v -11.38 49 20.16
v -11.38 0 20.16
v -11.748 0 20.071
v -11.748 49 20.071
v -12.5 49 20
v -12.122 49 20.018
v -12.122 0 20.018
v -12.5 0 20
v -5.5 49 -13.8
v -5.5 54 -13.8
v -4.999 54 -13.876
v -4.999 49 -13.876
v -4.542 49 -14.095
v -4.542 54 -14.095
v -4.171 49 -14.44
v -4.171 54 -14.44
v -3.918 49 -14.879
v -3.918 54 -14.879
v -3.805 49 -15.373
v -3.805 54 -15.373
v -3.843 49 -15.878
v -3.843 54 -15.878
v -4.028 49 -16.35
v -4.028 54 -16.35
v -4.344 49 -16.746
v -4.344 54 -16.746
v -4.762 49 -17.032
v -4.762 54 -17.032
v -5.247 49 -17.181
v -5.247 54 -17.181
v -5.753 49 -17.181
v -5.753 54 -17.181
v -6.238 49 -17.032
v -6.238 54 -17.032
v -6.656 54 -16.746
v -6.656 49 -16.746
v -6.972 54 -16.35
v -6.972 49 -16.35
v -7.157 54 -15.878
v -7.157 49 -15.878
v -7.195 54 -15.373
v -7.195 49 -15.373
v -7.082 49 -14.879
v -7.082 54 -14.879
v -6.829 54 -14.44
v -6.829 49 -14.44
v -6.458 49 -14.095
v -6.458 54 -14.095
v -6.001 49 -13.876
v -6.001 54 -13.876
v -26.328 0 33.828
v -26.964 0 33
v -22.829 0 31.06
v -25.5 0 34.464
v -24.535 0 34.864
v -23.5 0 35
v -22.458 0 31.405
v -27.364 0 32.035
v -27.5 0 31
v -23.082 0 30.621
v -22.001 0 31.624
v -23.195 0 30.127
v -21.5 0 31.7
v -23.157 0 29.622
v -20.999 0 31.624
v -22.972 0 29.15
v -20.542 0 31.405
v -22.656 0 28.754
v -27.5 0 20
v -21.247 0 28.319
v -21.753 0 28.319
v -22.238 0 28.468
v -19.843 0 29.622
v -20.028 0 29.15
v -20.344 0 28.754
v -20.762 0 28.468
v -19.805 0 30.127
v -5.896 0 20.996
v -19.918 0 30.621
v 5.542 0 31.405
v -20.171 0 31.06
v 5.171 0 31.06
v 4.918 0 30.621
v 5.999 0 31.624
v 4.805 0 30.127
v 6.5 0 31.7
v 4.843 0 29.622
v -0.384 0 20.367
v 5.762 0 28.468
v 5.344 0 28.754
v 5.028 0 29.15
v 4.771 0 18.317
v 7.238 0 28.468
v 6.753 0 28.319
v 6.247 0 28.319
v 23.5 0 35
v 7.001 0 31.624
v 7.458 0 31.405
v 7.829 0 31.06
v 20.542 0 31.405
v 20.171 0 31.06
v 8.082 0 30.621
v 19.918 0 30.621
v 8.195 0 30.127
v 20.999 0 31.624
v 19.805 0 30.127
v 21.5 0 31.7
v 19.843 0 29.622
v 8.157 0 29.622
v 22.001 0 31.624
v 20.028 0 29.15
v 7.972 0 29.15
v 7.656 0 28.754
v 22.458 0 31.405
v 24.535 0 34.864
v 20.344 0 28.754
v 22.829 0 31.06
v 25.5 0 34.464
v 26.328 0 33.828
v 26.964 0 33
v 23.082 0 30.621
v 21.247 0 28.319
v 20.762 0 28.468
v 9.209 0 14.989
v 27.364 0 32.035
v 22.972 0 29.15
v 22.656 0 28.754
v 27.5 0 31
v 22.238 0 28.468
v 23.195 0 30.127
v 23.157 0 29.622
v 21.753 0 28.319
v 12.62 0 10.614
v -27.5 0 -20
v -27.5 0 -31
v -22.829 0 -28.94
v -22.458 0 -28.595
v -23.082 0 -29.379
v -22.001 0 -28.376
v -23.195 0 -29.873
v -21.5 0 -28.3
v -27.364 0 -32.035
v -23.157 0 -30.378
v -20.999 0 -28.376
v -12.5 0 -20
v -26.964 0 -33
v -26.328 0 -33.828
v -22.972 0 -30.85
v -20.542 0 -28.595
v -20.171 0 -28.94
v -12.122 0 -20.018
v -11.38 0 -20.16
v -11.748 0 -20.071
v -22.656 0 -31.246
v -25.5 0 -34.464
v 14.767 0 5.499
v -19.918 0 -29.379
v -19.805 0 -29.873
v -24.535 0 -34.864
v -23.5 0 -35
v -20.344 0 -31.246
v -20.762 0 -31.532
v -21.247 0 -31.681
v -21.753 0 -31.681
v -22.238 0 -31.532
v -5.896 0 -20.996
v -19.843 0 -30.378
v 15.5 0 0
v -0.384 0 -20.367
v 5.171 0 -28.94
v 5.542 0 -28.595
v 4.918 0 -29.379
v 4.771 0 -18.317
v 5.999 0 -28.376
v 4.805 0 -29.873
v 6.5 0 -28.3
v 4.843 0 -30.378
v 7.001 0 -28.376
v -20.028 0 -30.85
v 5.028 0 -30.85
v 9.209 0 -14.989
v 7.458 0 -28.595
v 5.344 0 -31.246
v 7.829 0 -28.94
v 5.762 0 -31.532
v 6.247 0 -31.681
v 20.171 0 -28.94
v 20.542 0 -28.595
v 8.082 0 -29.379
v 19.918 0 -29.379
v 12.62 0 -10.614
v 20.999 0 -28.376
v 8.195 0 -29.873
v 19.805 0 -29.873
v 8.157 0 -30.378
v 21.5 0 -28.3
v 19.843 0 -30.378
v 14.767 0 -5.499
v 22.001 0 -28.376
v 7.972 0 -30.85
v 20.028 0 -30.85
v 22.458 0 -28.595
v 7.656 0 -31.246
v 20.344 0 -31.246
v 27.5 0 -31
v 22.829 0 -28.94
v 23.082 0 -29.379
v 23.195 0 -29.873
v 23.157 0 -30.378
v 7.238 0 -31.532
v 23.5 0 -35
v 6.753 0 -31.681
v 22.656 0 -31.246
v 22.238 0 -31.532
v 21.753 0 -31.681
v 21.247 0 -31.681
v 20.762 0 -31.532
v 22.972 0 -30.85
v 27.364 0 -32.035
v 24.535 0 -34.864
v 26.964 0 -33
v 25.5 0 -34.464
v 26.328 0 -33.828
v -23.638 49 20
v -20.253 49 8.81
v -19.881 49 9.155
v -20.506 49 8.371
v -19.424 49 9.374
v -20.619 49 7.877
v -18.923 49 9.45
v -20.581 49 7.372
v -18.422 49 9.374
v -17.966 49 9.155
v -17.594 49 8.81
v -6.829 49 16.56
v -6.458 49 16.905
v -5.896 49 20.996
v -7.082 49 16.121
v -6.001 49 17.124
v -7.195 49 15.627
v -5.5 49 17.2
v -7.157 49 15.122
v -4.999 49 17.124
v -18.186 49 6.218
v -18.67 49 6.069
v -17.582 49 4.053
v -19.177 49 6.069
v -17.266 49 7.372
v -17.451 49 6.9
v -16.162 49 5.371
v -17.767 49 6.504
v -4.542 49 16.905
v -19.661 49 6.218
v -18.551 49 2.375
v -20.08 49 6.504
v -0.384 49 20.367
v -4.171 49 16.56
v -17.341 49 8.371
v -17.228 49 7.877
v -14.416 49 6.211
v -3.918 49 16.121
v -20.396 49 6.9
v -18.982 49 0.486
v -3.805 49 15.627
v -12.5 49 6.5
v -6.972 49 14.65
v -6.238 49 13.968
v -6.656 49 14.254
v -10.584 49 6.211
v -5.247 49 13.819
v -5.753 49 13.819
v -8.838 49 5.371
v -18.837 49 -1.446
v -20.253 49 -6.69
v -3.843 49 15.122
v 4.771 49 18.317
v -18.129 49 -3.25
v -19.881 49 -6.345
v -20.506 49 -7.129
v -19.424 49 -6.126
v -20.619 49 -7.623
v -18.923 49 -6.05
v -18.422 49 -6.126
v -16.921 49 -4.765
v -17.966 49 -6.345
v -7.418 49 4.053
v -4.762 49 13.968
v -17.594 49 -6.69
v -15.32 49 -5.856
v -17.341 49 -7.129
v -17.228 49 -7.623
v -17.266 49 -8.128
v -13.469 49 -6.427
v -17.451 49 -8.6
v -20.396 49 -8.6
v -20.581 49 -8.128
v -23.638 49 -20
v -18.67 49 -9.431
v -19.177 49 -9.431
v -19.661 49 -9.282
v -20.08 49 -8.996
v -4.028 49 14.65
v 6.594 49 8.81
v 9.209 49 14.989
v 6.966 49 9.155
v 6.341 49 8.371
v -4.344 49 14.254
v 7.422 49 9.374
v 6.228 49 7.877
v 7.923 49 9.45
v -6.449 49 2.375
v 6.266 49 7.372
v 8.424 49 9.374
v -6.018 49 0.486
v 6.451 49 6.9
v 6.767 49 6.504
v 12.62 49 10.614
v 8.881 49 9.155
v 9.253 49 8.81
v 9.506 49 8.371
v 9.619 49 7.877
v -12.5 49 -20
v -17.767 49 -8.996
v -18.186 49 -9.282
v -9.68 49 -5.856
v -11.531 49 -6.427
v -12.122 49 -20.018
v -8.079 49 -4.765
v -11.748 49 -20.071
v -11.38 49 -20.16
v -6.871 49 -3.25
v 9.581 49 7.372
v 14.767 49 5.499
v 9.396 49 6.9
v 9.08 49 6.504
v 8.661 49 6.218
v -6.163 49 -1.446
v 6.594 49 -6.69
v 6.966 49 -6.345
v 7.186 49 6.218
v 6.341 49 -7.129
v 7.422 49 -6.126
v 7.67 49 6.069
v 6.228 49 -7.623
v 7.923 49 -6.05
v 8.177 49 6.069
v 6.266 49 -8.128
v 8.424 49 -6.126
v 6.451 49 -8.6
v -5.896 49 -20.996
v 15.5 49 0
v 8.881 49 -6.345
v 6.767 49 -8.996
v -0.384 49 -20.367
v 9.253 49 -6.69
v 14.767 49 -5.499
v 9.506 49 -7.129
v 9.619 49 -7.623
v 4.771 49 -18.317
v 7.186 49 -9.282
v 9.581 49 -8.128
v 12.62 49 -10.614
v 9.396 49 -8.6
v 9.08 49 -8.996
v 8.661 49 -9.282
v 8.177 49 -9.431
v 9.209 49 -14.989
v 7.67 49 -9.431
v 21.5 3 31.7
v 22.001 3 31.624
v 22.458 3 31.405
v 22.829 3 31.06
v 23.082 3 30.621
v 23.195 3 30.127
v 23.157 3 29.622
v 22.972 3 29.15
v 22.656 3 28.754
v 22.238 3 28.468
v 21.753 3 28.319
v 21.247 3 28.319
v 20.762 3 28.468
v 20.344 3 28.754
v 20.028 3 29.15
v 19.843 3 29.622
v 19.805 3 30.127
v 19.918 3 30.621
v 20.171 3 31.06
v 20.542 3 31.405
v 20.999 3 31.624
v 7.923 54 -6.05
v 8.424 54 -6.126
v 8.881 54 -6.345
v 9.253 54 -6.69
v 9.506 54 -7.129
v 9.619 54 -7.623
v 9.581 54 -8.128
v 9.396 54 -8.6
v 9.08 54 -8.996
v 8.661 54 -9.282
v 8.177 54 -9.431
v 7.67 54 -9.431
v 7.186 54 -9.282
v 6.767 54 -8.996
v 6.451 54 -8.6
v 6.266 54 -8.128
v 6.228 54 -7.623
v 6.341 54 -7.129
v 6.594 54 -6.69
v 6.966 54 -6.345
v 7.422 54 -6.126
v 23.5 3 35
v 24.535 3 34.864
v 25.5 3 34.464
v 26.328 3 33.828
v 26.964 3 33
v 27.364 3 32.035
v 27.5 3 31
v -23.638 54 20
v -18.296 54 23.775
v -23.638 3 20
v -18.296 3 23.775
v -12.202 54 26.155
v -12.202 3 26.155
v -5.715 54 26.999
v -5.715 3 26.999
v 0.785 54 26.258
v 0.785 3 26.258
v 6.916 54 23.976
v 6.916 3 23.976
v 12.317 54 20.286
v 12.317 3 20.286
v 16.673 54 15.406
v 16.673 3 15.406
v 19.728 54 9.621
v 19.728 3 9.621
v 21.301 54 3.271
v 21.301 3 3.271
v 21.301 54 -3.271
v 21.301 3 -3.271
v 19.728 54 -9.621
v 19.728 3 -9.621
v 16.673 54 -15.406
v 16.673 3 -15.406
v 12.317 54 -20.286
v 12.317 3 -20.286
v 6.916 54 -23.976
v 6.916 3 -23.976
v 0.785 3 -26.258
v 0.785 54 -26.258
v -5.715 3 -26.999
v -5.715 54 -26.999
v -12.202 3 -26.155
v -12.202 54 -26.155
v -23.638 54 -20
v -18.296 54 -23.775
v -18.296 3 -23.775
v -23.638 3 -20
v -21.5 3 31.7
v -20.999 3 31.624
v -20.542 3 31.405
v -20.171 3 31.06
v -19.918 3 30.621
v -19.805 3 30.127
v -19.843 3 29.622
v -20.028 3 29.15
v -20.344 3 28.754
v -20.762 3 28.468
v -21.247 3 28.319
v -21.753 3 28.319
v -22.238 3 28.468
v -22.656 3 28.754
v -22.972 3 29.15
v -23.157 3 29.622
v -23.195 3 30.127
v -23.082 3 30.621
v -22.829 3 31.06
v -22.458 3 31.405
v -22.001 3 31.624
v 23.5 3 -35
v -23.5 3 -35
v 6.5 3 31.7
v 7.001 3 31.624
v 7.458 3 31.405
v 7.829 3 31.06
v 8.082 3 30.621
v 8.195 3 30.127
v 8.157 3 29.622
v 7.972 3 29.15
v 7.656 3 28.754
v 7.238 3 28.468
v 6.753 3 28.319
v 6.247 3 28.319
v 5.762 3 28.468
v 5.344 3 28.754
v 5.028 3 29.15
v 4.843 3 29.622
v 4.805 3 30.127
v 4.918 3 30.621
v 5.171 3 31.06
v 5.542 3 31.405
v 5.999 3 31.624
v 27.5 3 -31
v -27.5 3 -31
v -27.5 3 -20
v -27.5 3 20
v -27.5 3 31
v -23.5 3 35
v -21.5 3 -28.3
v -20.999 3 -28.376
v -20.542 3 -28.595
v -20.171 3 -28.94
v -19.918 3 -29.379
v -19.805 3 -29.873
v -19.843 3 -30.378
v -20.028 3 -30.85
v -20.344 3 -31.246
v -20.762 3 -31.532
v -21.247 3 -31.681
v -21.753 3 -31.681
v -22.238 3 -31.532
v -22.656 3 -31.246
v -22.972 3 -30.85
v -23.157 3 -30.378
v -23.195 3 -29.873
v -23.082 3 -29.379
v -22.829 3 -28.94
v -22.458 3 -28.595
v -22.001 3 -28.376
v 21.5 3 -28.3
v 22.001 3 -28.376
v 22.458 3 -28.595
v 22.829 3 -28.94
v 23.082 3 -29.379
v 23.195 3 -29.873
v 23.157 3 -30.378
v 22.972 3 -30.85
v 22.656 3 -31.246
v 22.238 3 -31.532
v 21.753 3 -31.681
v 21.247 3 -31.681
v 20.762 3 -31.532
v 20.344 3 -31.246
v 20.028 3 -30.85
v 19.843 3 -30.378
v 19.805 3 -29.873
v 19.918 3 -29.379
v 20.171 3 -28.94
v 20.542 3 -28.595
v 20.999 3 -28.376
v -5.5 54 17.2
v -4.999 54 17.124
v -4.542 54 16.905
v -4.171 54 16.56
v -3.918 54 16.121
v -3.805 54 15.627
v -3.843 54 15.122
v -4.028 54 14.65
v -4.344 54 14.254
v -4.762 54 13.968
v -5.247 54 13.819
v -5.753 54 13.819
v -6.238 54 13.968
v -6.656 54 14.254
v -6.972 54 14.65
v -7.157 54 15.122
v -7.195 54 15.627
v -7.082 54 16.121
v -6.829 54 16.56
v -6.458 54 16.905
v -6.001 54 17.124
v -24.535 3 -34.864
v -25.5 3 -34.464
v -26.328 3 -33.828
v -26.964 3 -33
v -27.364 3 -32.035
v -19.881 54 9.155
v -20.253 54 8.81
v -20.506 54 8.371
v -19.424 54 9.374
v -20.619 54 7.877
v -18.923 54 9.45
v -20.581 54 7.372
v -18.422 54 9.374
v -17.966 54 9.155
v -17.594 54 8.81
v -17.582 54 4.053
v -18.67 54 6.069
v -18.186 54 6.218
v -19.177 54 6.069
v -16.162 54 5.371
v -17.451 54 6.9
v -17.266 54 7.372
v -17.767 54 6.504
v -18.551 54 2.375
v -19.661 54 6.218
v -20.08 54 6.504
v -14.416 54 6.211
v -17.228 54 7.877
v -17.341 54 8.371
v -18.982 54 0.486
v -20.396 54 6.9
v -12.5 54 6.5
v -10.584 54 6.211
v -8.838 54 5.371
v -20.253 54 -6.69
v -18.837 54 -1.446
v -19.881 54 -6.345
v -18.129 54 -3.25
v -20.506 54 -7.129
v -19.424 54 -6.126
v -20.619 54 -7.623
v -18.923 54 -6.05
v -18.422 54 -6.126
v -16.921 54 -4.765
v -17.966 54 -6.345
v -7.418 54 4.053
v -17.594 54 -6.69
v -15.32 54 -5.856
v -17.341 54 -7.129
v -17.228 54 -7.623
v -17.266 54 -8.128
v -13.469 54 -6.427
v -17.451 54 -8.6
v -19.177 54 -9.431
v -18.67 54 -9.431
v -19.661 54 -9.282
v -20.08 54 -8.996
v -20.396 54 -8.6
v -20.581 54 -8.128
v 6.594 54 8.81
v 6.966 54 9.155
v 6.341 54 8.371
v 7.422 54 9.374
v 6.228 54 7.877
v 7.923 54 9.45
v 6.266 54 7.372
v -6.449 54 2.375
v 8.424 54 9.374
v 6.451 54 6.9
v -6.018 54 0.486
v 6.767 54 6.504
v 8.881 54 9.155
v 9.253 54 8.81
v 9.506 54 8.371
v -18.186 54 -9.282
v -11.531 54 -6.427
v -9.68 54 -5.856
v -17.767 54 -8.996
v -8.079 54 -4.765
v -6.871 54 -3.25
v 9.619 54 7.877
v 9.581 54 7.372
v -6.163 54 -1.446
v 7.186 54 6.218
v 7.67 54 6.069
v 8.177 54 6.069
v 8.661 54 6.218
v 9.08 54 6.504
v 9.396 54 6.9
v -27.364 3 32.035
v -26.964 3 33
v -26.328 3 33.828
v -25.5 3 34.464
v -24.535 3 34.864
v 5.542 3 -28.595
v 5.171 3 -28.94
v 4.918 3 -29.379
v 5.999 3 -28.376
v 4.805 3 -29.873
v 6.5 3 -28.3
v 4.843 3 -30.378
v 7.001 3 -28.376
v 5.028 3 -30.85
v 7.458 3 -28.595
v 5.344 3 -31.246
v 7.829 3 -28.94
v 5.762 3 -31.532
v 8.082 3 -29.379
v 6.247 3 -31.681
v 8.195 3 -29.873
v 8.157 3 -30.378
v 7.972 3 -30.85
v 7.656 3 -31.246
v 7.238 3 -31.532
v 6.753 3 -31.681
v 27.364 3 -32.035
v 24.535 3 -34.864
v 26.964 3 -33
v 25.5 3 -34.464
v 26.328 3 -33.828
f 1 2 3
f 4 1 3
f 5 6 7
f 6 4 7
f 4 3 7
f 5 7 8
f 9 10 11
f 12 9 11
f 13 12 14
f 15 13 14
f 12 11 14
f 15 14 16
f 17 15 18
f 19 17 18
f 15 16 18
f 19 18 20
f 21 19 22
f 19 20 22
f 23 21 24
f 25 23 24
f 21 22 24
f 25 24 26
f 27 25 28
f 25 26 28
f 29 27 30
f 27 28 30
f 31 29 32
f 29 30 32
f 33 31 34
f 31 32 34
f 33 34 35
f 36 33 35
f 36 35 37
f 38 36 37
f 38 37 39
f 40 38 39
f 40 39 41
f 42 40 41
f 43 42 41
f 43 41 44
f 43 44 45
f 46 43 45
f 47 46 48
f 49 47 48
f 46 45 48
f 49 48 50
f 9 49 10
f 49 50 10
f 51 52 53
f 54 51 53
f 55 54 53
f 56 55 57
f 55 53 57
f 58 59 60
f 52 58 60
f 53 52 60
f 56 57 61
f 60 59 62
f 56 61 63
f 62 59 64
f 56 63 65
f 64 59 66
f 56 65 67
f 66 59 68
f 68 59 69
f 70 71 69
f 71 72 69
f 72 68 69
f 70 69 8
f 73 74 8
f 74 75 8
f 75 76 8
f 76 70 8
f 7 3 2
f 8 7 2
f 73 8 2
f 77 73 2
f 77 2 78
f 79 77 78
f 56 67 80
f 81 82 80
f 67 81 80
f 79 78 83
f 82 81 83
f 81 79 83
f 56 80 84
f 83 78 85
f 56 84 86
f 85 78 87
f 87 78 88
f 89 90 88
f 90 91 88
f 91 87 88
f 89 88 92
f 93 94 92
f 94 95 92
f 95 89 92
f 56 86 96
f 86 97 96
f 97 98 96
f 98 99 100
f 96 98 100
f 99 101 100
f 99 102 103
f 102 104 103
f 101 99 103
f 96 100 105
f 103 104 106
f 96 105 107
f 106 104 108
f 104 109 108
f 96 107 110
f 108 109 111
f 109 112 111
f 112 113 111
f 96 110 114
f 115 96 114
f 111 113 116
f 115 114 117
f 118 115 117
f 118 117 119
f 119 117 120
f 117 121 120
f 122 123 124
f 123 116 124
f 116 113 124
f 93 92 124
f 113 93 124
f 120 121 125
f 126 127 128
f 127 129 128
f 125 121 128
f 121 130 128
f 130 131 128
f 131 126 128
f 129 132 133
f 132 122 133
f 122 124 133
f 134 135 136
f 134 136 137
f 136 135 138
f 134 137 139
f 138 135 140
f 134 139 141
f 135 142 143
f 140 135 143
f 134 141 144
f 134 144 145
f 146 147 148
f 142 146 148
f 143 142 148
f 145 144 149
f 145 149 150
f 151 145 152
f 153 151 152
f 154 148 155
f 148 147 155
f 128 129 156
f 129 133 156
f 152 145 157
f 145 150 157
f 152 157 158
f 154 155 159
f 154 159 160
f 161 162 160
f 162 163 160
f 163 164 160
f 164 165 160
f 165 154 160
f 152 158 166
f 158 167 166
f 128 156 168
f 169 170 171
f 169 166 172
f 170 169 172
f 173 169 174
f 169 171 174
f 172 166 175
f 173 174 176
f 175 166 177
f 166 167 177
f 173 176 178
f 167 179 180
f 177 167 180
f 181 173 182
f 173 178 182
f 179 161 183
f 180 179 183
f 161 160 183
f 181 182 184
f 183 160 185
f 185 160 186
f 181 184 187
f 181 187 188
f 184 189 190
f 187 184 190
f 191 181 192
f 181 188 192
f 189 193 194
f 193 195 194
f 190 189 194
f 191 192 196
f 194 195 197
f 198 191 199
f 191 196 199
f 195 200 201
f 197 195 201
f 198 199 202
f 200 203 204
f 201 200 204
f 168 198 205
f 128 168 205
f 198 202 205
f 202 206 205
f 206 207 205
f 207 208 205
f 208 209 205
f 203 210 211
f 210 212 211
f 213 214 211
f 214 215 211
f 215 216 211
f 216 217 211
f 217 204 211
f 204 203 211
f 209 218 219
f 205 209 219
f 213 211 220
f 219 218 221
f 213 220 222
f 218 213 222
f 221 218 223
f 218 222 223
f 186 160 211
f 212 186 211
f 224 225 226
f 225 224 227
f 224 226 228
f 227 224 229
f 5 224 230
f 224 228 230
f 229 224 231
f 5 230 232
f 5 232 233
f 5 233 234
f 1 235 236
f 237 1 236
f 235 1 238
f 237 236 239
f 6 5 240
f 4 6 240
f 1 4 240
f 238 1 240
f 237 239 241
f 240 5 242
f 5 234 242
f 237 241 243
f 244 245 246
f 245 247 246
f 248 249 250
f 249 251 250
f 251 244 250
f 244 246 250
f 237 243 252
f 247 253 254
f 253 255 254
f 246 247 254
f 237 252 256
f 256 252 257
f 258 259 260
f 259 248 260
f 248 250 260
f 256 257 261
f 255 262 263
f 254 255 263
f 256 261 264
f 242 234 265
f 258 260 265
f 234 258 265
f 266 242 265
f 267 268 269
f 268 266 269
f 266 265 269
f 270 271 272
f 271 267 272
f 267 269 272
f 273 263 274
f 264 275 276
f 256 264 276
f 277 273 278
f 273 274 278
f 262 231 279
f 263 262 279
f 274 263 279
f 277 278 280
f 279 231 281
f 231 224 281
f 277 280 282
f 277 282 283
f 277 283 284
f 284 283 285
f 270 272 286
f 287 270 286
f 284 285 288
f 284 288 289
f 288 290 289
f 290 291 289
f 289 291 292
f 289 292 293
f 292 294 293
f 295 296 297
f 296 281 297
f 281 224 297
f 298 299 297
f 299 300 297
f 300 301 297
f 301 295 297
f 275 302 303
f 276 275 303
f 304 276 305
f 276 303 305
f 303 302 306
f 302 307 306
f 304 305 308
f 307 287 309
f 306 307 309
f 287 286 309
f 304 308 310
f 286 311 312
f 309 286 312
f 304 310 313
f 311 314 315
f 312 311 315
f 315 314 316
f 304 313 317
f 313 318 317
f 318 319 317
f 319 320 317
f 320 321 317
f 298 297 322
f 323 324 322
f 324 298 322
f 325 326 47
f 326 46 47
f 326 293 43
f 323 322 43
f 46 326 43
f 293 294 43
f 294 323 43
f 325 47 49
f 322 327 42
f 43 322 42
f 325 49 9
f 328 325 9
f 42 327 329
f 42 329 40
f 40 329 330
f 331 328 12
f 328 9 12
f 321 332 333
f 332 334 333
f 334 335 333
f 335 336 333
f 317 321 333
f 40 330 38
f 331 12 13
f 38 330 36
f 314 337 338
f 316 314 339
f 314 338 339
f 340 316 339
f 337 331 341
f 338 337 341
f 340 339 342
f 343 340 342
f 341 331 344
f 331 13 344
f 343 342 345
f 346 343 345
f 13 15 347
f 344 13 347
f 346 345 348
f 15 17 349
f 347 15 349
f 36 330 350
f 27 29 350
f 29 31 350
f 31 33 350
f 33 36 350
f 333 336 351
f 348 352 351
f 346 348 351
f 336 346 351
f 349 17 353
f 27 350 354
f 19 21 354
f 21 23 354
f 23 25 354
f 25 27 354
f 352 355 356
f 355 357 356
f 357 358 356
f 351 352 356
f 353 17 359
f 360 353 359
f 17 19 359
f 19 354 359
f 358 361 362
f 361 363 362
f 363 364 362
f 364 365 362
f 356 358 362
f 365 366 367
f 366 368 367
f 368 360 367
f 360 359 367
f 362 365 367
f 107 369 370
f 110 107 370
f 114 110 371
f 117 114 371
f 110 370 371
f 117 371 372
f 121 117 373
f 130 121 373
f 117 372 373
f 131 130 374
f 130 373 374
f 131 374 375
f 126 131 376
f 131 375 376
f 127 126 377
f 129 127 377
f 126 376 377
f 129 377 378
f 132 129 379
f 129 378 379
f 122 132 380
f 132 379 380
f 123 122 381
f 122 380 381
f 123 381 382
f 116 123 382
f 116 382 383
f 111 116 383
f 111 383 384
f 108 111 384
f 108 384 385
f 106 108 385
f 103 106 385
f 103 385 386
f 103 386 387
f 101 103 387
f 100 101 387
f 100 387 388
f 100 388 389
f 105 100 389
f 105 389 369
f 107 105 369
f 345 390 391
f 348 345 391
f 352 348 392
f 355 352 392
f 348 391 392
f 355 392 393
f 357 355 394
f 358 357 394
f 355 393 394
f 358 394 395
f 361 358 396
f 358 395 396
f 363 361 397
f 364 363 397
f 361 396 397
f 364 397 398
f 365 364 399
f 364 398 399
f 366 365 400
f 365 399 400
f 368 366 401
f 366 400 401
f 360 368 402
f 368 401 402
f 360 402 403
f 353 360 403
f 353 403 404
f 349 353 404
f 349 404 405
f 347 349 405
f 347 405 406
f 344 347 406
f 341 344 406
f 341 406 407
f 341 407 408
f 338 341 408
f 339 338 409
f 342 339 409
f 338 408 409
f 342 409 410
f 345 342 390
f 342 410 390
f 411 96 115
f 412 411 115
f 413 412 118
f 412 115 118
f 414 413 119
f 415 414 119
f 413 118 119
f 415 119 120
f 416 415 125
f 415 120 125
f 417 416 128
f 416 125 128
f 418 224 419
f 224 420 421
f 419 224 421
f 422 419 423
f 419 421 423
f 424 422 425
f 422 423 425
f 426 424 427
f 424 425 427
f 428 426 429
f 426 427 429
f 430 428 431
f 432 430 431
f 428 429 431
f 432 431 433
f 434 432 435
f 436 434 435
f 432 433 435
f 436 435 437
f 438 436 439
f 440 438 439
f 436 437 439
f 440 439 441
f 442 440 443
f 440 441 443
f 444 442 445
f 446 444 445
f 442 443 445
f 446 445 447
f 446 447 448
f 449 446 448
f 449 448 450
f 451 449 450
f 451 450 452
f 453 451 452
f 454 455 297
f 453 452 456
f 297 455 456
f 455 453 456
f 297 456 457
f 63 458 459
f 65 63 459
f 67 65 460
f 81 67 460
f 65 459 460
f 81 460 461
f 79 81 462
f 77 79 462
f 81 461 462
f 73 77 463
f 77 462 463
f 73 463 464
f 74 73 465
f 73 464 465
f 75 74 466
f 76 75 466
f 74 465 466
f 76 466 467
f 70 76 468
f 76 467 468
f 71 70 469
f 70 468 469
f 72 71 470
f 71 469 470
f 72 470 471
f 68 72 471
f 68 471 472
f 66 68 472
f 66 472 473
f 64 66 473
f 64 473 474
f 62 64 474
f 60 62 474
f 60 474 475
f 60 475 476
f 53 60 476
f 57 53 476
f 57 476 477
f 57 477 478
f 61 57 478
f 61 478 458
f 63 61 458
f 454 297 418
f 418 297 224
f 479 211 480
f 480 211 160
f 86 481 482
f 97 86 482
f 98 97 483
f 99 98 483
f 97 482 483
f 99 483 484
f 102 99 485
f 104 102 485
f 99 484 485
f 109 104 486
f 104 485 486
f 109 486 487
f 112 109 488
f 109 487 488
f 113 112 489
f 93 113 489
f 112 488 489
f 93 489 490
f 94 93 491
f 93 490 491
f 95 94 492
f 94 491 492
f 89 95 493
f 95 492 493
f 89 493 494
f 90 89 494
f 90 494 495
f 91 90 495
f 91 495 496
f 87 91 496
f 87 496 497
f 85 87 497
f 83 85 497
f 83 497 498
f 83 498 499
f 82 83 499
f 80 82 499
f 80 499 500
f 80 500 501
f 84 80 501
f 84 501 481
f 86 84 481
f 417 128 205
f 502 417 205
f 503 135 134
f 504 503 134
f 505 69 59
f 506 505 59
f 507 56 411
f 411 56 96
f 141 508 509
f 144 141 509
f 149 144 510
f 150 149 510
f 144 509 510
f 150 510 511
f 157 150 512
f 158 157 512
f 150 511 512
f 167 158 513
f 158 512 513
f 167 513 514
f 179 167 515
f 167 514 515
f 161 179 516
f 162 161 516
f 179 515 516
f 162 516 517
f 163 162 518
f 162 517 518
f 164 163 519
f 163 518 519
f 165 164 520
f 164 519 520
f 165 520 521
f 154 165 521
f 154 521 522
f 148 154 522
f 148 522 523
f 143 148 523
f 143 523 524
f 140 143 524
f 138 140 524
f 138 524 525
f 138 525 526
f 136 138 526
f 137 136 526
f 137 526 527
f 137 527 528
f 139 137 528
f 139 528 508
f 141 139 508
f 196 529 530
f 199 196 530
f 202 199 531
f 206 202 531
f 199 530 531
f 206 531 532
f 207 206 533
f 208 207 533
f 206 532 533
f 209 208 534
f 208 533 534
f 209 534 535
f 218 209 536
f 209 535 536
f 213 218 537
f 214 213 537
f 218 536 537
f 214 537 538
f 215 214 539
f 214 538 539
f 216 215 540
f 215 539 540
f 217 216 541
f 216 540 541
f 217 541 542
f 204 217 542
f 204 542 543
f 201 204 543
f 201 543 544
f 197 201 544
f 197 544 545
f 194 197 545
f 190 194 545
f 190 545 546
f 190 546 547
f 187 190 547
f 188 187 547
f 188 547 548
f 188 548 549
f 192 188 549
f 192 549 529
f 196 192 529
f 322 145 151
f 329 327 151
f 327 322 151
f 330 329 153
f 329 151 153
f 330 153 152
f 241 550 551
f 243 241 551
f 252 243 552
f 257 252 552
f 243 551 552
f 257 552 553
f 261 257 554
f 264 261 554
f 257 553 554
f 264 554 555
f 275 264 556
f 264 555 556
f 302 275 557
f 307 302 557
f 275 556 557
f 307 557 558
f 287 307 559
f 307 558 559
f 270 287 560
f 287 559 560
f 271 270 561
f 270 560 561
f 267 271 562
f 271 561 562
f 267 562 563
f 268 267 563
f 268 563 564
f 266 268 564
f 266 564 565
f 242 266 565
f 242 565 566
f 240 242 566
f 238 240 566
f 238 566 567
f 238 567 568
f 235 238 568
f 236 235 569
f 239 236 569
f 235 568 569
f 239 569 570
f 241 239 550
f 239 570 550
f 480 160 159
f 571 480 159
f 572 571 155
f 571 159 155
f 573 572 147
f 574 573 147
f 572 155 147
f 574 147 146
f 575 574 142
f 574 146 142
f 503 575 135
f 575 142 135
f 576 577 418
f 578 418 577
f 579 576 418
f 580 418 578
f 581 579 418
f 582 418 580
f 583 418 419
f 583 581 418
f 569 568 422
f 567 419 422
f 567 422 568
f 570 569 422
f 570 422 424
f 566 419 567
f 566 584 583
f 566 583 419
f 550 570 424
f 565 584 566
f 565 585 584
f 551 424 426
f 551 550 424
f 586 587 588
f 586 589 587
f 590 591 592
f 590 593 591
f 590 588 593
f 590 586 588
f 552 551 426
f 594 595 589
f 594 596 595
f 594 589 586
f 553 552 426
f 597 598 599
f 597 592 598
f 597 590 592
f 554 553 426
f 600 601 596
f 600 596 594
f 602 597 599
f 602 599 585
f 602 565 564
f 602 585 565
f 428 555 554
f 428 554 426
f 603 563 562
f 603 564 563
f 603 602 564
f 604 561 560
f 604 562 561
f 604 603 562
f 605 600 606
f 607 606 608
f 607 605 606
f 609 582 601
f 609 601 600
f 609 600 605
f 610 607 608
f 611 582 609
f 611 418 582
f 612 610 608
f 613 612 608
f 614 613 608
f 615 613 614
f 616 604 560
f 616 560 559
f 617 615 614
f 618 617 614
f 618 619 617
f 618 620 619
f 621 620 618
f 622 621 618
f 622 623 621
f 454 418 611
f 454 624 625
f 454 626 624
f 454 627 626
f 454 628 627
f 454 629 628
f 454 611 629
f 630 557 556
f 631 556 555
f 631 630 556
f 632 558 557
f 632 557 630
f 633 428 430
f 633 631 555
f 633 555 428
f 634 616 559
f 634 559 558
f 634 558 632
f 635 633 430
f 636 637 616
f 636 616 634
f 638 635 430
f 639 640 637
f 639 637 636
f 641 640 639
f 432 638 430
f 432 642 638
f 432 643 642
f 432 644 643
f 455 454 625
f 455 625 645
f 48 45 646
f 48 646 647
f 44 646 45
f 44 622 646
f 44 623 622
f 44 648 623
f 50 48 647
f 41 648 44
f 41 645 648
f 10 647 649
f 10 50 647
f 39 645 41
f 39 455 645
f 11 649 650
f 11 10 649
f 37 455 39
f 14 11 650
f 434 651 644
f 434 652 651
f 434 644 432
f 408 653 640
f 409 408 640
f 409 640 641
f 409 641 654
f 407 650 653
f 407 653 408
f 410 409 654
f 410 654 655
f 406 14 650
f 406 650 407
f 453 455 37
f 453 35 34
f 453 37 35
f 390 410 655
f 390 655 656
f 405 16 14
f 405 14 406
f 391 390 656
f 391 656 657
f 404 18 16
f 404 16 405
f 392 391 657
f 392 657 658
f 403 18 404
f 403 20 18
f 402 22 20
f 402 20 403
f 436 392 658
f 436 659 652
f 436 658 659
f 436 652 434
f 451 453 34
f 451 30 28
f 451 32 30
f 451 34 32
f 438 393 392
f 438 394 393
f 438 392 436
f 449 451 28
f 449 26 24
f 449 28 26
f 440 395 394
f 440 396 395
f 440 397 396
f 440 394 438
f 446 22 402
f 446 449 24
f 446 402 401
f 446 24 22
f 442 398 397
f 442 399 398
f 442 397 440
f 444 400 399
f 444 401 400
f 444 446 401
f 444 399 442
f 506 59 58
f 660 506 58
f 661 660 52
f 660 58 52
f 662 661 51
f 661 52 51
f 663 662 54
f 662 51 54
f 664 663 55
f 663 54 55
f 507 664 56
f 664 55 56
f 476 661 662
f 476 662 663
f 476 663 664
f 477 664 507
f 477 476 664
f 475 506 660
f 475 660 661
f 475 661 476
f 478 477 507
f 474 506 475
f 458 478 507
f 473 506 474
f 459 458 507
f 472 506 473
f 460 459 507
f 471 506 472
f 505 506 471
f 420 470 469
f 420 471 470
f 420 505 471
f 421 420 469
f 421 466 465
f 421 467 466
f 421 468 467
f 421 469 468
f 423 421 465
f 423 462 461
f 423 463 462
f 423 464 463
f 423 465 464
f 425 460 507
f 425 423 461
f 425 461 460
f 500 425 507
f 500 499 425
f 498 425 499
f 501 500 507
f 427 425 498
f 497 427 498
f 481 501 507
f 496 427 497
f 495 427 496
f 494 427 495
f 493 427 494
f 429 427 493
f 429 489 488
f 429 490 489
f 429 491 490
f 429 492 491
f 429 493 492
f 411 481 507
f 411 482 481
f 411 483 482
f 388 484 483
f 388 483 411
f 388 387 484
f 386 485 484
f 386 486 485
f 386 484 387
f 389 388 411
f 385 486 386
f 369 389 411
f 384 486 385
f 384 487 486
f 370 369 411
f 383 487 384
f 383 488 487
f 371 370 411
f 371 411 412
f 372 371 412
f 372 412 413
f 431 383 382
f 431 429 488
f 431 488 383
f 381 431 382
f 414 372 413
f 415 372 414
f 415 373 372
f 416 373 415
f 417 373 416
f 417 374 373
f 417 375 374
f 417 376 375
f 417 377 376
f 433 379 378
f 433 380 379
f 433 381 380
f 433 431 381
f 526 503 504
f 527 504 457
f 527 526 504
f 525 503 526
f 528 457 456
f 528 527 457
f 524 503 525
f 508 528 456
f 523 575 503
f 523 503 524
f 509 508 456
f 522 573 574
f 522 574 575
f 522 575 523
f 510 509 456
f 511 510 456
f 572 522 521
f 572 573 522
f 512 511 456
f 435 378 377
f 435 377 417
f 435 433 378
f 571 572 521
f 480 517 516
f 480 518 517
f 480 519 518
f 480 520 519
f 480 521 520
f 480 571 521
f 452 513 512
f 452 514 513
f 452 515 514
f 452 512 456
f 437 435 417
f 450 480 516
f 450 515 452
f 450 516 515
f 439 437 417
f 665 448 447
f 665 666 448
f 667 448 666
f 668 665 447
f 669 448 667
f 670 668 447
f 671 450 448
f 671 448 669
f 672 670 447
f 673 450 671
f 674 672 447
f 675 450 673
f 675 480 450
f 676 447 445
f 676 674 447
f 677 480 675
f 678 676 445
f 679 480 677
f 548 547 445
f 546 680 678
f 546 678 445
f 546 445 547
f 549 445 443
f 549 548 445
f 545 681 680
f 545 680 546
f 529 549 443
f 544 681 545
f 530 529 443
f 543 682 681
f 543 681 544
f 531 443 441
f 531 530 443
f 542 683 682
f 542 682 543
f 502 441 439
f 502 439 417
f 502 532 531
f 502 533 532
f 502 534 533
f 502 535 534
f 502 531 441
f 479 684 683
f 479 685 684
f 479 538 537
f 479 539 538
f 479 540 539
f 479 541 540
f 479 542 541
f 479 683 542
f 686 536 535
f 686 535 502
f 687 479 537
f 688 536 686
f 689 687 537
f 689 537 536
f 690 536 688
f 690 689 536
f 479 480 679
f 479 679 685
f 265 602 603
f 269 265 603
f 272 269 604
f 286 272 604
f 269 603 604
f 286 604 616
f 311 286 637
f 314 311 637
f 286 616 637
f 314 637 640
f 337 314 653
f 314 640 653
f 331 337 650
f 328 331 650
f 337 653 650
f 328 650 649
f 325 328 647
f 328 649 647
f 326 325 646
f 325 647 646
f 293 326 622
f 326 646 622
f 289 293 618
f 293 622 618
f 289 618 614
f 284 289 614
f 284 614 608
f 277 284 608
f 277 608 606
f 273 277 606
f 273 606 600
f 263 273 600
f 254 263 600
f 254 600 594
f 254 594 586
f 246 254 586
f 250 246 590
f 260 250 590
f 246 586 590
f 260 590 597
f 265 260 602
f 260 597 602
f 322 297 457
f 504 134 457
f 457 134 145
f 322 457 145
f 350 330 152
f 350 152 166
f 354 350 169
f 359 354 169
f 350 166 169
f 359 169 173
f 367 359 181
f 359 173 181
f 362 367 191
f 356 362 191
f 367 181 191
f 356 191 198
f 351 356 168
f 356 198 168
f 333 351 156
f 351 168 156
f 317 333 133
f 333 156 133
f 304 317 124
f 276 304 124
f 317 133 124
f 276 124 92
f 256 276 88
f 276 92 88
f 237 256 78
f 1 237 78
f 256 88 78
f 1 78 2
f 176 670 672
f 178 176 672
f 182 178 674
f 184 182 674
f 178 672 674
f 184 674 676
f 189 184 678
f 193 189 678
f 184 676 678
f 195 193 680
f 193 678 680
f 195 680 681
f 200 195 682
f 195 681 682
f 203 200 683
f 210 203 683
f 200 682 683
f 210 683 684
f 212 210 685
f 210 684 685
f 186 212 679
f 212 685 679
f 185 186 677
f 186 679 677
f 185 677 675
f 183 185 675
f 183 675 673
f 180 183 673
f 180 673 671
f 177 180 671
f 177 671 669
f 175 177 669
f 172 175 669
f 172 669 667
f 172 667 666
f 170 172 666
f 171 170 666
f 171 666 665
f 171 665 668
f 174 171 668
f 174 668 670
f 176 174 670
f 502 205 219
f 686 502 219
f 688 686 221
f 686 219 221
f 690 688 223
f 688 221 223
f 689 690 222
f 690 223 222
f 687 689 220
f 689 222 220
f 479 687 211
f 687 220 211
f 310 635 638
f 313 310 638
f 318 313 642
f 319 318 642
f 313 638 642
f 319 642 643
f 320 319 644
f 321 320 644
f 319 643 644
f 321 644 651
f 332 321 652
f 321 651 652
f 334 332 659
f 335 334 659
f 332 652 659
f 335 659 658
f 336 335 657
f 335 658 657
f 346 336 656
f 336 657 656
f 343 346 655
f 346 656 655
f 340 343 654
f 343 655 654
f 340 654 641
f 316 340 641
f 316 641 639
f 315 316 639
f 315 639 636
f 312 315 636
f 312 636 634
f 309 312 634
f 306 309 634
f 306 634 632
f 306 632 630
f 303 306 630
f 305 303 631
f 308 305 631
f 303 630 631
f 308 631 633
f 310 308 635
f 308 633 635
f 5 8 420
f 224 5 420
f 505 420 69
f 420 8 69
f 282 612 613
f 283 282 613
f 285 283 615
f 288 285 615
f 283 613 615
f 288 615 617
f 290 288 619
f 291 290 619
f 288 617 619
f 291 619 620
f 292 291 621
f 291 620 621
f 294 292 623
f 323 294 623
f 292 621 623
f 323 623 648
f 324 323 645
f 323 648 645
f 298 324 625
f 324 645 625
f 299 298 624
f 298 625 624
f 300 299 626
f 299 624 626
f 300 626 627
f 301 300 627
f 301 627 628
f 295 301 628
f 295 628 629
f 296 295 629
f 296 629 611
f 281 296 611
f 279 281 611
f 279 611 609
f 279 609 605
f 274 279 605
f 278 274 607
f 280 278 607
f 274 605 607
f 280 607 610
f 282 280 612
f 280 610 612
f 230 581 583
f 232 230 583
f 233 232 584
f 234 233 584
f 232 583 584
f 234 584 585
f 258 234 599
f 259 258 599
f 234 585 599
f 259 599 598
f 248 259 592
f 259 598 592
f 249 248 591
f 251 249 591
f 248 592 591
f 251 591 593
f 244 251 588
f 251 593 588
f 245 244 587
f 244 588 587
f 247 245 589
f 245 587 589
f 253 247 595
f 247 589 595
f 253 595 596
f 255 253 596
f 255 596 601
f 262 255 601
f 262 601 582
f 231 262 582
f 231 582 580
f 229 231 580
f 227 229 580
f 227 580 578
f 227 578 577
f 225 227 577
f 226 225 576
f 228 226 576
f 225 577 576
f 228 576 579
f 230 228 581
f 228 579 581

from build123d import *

# Parameters (mm, degrees)
DODANIE_WYCI_GNI_CIE1_DEPTH = 3
DODANIE_WYCI_GNI_CIE2_DEPTH = 51
DODANIE_WYCI_GNI_CIE3_START = -5
DODANIE_WYCI_GNI_CIE3_DEPTH = 5
SZKIC4_R                    = 1.7
WYTNIJ_WYCI_GNI_CIE1_DEPTH  = 5
SZKIC5_R                    = 6.5
SZKIC5_R_2                  = 1.7
WYTNIJ_WYCI_GNI_CIE2_DEPTH  = 5


with BuildPart() as part:
    # Szkic1 → Dodanie-wyciągnięcie1 (new body)
    with BuildSketch(Plane(origin=(0, 0, 0), x_dir=(1, 0, 0), z_dir=(0, 1, 0))):
        with BuildLine():
            Line((-27.5, 20), (-12.5, 20))
            ThreePointArc((-12.5, 20), (-11.934314575, 20.040202025), (-11.38, 20.16))
            ThreePointArc((-11.38, 20.16), (15.5, 0), (-11.38, -20.16))
            ThreePointArc((-11.38, -20.16), (-11.934314575, -20.040202025), (-12.5, -20))
            Line((-12.5, -20), (-27.5, -20))
            Line((-27.5, -20), (-27.5, -31))
            ThreePointArc((-27.5, -31), (-26.328427125, -33.828427125), (-23.5, -35))
            Line((-23.5, -35), (23.5, -35))
            ThreePointArc((23.5, -35), (26.328427125, -33.828427125), (27.5, -31))
            Line((27.5, -31), (27.5, 31))
            ThreePointArc((27.5, 31), (26.328427125, 33.828427125), (23.5, 35))
            Line((23.5, 35), (-23.5, 35))
            ThreePointArc((-23.5, 35), (-26.328427125, 33.828427125), (-27.5, 31))
            Line((-27.5, 31), (-27.5, 20))
        make_face()
    extrude(amount=DODANIE_WYCI_GNI_CIE1_DEPTH)

    # Szkic2 → Dodanie-wyciągnięcie2 (add)
    with BuildSketch(Plane(origin=(0, 3, 0), x_dir=(1, 0, 0), z_dir=(0, 1, 0))):
        with BuildLine():
            Line((-12.5, -20), (-23.638357147, -20))
            ThreePointArc((-23.638357147, -20), (21.5, 0), (-23.638357147, 20))
            Line((-23.638357147, 20), (-12.5, 20))
            ThreePointArc((-12.5, 20), (-11.934314575, 20.040202025), (-11.38, 20.16))
            ThreePointArc((-11.38, 20.16), (15.5, 0), (-11.38, -20.16))
            ThreePointArc((-11.38, -20.16), (-11.934314575, -20.040202025), (-12.5, -20))
        make_face()
    extrude(amount=DODANIE_WYCI_GNI_CIE2_DEPTH)

    # Szkic3 → Dodanie-wyciągnięcie3 (add)
    with BuildSketch(Plane(origin=(0, 54, 0), x_dir=(1, 0, 0), z_dir=(0, 1, 0)).offset(DODANIE_WYCI_GNI_CIE3_START)):
        with BuildLine():
            Line((-23.638357147, 20), (-23.638357147, -20))
            ThreePointArc((-23.638357147, -20), (21.5, 0), (-23.638357147, 20))
        make_face()
    extrude(amount=DODANIE_WYCI_GNI_CIE3_DEPTH)

    # Szkic4 → Wytnij-wyciągnięcie1 (cut)
    with BuildSketch(Plane(origin=(0, 3, 0), x_dir=(1, 0, 0), z_dir=(0, 1, 0))):
        with Locations(Location((-21.5, -30, 0), (0, 0, 270))):
            Circle(SZKIC4_R)
        with Locations(Location((21.5, -30, 0), (0, 0, 270))):
            Circle(SZKIC4_R)
        with Locations(Location((21.5, 30, 0), (0, 0, 270))):
            Circle(SZKIC4_R)
        with Locations(Location((-21.5, 30, 0), (0, 0, 270))):
            Circle(SZKIC4_R)
        with Locations(Location((6.5, -30, 0), (0, 0, 270))):
            Circle(SZKIC4_R)
        with Locations(Location((6.5, 30, 0), (0, 0, 270))):
            Circle(SZKIC4_R)
    extrude(amount=-WYTNIJ_WYCI_GNI_CIE1_DEPTH, mode=Mode.SUBTRACT)

    # Szkic5 → Wytnij-wyciągnięcie2 (cut)
    with BuildSketch(Plane(origin=(0, 54, 0), x_dir=(1, 0, 0), z_dir=(0, 1, 0))):
        with Locations(Location((-12.5, 0, 0), (0, 0, 270))):
            Circle(SZKIC5_R)
        with Locations(Location((-5.5, -15.5, 0), (0, 0, 270))):
            Circle(SZKIC5_R_2)
        with Locations(Location((-18.923393759, -7.75, 0), (0, 0, 270))):
            Circle(SZKIC5_R_2)
        with Locations(Location((-18.923393759, 7.75, 0), (0, 0, 270))):
            Circle(SZKIC5_R_2)
        with Locations(Location((-5.5, 15.5, 0), (0, 0, 270))):
            Circle(SZKIC5_R_2)
        with Locations(Location((7.923393759, 7.75, 0), (0, 0, 270))):
            Circle(SZKIC5_R_2)
        with Locations(Location((7.923393759, -7.75, 0), (0, 0, 270))):
            Circle(SZKIC5_R_2)
    extrude(amount=-WYTNIJ_WYCI_GNI_CIE2_DEPTH, mode=Mode.SUBTRACT)


solid = part.part
